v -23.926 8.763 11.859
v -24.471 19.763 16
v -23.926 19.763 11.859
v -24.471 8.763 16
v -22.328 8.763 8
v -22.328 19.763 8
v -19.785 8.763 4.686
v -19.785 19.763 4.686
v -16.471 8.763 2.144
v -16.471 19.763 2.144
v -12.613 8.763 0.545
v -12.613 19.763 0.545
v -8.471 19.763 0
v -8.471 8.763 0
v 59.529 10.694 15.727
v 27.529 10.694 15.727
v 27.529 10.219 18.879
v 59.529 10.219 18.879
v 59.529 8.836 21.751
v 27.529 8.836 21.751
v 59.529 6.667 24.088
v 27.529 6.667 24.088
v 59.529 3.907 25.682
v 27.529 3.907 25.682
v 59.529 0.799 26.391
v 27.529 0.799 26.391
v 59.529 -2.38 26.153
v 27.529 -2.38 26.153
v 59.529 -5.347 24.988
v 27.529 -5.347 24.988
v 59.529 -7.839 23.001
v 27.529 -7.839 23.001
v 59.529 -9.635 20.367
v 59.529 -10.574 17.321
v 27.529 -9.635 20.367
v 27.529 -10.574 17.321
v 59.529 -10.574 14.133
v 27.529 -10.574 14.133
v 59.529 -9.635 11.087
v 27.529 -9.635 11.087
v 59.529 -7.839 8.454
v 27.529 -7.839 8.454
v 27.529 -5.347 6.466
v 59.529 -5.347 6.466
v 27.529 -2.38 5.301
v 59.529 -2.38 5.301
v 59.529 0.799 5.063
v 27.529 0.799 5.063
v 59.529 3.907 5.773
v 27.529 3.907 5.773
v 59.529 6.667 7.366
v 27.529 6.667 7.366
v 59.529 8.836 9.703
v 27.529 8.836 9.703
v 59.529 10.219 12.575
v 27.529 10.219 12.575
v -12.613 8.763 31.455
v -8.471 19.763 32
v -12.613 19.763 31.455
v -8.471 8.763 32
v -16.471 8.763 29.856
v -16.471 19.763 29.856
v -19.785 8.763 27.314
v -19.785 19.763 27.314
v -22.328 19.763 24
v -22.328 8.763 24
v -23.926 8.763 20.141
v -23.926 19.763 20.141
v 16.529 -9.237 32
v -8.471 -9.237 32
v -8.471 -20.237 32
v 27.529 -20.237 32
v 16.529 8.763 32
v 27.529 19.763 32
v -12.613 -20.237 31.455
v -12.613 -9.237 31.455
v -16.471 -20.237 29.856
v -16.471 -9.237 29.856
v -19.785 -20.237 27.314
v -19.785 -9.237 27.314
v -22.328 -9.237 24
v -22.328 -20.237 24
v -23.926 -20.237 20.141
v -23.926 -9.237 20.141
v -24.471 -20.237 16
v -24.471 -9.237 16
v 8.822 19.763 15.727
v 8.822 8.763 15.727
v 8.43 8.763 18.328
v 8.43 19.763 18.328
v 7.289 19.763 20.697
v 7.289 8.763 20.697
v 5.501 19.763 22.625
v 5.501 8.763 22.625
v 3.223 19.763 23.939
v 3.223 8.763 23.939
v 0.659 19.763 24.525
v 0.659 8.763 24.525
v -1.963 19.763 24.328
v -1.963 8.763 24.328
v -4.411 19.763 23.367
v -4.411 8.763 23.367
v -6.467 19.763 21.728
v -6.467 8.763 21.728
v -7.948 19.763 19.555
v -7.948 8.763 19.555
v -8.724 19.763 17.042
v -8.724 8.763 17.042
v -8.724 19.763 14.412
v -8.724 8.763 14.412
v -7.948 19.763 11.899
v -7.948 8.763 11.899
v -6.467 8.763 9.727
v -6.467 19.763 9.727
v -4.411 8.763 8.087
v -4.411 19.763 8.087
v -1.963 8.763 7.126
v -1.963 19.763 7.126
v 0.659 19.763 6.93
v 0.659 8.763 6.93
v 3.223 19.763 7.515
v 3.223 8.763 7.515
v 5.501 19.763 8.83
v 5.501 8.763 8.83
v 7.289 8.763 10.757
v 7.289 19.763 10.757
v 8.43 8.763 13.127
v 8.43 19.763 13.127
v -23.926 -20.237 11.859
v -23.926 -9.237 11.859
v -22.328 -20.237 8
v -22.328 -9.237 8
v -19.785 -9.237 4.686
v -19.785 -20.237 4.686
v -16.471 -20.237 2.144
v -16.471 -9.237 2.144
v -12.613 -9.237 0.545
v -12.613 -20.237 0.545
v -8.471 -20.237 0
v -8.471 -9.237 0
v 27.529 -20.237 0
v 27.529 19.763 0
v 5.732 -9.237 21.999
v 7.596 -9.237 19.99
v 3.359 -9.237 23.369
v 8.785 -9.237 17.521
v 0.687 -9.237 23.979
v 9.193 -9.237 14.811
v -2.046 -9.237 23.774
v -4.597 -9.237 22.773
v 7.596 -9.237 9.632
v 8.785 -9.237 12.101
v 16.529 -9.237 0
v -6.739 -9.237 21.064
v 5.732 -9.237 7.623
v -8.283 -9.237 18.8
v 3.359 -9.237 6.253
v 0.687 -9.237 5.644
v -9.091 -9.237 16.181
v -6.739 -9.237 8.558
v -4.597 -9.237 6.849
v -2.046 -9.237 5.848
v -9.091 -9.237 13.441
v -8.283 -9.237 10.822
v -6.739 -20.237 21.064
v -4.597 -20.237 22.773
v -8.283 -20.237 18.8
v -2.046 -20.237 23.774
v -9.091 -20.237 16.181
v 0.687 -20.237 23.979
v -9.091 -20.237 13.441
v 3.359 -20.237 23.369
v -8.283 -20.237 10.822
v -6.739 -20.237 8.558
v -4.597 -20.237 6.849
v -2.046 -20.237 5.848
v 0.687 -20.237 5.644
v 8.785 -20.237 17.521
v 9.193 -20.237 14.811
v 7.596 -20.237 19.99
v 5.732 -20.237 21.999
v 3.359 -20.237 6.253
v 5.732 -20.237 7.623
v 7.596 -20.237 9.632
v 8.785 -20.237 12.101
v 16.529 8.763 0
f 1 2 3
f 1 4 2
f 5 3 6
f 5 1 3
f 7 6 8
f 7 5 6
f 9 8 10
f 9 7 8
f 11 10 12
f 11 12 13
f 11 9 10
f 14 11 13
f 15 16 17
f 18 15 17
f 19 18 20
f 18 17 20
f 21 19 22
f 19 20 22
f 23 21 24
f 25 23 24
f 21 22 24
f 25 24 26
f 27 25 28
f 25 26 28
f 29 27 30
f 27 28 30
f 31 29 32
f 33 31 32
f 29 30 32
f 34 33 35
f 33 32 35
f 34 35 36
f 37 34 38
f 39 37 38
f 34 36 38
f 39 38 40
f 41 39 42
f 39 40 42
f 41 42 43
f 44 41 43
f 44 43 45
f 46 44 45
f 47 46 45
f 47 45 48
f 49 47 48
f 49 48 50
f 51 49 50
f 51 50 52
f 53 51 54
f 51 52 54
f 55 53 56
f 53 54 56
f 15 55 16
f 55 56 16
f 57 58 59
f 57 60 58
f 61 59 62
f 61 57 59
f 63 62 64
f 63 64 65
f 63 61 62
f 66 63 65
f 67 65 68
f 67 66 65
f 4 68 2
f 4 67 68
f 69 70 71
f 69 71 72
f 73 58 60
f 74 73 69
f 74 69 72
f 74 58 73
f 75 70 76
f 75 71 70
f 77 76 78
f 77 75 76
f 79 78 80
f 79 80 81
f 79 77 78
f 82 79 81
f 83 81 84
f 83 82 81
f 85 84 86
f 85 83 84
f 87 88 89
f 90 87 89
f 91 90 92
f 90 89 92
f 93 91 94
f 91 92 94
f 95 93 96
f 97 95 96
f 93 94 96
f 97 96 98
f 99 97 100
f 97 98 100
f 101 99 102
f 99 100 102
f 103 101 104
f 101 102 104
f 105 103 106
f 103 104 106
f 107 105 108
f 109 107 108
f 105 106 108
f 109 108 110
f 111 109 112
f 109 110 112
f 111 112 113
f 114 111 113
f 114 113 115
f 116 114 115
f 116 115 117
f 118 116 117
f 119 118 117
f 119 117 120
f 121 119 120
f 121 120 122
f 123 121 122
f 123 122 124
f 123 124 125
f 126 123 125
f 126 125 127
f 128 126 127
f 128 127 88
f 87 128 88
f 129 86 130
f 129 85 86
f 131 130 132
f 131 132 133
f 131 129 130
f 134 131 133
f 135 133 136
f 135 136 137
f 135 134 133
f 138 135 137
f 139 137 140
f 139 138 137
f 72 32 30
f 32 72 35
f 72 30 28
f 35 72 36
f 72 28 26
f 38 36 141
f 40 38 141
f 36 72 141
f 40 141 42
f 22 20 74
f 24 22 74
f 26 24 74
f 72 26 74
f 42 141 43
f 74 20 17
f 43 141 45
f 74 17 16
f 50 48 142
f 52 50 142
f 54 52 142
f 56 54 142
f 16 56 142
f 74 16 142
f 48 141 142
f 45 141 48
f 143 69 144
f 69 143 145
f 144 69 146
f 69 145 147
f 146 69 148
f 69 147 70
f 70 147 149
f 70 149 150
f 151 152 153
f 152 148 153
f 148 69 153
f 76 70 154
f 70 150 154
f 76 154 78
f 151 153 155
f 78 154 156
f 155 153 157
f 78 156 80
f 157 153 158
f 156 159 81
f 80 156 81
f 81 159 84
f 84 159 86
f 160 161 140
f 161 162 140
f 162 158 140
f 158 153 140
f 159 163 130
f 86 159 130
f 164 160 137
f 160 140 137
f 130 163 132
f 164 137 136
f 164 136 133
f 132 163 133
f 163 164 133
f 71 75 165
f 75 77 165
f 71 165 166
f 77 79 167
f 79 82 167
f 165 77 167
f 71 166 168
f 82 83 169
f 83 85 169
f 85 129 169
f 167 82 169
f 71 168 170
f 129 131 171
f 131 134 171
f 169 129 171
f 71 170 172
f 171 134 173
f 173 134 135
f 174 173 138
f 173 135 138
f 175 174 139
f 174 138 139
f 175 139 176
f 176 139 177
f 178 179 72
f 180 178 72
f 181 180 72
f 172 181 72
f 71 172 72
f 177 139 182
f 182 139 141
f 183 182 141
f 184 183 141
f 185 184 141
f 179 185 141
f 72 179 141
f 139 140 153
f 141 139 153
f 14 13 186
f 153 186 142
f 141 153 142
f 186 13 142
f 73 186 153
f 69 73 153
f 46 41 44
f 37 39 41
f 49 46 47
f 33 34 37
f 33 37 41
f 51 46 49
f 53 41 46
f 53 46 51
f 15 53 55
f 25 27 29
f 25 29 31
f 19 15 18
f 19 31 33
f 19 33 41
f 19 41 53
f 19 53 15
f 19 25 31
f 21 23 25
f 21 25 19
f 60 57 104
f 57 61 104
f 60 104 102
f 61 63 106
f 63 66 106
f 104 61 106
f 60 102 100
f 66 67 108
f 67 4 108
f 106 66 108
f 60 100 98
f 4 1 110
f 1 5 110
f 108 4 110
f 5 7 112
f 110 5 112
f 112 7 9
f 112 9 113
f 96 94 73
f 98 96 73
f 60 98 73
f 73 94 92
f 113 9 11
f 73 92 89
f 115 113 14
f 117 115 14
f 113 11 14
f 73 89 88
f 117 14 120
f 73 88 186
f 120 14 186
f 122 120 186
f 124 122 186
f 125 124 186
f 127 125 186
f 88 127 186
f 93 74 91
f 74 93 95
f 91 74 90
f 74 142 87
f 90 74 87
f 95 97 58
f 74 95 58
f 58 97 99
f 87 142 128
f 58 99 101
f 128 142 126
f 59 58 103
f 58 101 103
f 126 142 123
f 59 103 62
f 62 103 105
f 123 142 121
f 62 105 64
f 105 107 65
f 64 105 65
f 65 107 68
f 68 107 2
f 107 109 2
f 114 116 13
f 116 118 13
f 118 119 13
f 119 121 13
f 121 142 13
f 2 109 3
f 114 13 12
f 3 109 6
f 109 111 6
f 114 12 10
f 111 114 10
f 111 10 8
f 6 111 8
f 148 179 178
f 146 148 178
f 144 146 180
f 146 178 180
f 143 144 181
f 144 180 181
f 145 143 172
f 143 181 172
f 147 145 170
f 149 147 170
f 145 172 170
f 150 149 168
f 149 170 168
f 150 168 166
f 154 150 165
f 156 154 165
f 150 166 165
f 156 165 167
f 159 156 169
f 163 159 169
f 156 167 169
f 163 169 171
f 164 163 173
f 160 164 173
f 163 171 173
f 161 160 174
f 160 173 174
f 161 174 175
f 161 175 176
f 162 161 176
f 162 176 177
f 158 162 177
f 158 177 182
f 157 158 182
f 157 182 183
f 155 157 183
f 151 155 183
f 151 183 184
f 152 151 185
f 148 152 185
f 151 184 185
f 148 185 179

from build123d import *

# Parameters (mm, degrees)
F1_DEPTH  = 32
F2_R      = 9.193205317
F4_DEPTH  = 11
F3_R      = 8.8221237906
F5_DEPTH  = 50.8
F6_R      = 16
F7_R      = 15.99999
F8_R      = 16
F9_R      = 15.99999
F10_R     = 10.6938119657
F11_DEPTH = 32


# Not quite as in the source:
# - a fillet or chamfer is up to 0.001 mm smaller than in the source, because OpenCascade refuses the exact size


with BuildPart() as f1:
    # F0 (on Top) → F1 (new body)
    with BuildSketch(Plane.XY):
        Polygon((16.5285665829, 19.762864985), (-24.4714334171, 19.762864985), (-24.4714334171, 8.762864985), (16.5285665829, 8.762864985), (16.5285665829, -9.237135015), (-24.4714334171, -9.237135015), (-24.4714334171, -20.237135015), (27.5285665829, -20.237135015), (27.5285665829, 19.762864985), align=None)
    extrude(amount=F1_DEPTH)

    # F2 (on face) → F4 (cut)
    with BuildSketch(Plane.XZ.offset(20.237135015)):
        with Locations((0, 14.8110119626)):
            Circle(F2_R)
    extrude(amount=-F4_DEPTH, mode=Mode.SUBTRACT)

    # F3 (on Front) → F5 (cut)
    with BuildSketch(Plane.XZ):
        with Locations((0, 15.7271567732)):
            Circle(F3_R)
    extrude(amount=-F5_DEPTH, mode=Mode.SUBTRACT)

    # F6
    f6_edges = [f1.edges().sort_by_distance(p)[0] for p in [
        (-24.471433, -14.737135, 32),
    ]]
    fillet(f6_edges, radius=F6_R)

    # F7 (radius 16 in the source; OpenCascade refuses exactly that, so slightly less here)
    f7_edges = [f1.edges().sort_by_distance(p)[0] for p in [
        (-24.471433, -14.737135, 0),
    ]]
    fillet(f7_edges, radius=F7_R)

    # F8
    f8_edges = [f1.edges().sort_by_distance(p)[0] for p in [
        (-24.471433, 14.262865, 32),
    ]]
    fillet(f8_edges, radius=F8_R)

    # F9 (radius 16 in the source; OpenCascade refuses exactly that, so slightly less here)
    f9_edges = [f1.edges().sort_by_distance(p)[0] for p in [
        (-24.471433, 14.262865, 0),
    ]]
    fillet(f9_edges, radius=F9_R)

    # F10 (on face) → F11 (join)
    with BuildSketch(Plane.YZ.offset(27.5285665829)):
        with Locations((0, 15.7271567732)):
            Circle(F10_R)
    extrude(amount=F11_DEPTH)


solid = f1.part
